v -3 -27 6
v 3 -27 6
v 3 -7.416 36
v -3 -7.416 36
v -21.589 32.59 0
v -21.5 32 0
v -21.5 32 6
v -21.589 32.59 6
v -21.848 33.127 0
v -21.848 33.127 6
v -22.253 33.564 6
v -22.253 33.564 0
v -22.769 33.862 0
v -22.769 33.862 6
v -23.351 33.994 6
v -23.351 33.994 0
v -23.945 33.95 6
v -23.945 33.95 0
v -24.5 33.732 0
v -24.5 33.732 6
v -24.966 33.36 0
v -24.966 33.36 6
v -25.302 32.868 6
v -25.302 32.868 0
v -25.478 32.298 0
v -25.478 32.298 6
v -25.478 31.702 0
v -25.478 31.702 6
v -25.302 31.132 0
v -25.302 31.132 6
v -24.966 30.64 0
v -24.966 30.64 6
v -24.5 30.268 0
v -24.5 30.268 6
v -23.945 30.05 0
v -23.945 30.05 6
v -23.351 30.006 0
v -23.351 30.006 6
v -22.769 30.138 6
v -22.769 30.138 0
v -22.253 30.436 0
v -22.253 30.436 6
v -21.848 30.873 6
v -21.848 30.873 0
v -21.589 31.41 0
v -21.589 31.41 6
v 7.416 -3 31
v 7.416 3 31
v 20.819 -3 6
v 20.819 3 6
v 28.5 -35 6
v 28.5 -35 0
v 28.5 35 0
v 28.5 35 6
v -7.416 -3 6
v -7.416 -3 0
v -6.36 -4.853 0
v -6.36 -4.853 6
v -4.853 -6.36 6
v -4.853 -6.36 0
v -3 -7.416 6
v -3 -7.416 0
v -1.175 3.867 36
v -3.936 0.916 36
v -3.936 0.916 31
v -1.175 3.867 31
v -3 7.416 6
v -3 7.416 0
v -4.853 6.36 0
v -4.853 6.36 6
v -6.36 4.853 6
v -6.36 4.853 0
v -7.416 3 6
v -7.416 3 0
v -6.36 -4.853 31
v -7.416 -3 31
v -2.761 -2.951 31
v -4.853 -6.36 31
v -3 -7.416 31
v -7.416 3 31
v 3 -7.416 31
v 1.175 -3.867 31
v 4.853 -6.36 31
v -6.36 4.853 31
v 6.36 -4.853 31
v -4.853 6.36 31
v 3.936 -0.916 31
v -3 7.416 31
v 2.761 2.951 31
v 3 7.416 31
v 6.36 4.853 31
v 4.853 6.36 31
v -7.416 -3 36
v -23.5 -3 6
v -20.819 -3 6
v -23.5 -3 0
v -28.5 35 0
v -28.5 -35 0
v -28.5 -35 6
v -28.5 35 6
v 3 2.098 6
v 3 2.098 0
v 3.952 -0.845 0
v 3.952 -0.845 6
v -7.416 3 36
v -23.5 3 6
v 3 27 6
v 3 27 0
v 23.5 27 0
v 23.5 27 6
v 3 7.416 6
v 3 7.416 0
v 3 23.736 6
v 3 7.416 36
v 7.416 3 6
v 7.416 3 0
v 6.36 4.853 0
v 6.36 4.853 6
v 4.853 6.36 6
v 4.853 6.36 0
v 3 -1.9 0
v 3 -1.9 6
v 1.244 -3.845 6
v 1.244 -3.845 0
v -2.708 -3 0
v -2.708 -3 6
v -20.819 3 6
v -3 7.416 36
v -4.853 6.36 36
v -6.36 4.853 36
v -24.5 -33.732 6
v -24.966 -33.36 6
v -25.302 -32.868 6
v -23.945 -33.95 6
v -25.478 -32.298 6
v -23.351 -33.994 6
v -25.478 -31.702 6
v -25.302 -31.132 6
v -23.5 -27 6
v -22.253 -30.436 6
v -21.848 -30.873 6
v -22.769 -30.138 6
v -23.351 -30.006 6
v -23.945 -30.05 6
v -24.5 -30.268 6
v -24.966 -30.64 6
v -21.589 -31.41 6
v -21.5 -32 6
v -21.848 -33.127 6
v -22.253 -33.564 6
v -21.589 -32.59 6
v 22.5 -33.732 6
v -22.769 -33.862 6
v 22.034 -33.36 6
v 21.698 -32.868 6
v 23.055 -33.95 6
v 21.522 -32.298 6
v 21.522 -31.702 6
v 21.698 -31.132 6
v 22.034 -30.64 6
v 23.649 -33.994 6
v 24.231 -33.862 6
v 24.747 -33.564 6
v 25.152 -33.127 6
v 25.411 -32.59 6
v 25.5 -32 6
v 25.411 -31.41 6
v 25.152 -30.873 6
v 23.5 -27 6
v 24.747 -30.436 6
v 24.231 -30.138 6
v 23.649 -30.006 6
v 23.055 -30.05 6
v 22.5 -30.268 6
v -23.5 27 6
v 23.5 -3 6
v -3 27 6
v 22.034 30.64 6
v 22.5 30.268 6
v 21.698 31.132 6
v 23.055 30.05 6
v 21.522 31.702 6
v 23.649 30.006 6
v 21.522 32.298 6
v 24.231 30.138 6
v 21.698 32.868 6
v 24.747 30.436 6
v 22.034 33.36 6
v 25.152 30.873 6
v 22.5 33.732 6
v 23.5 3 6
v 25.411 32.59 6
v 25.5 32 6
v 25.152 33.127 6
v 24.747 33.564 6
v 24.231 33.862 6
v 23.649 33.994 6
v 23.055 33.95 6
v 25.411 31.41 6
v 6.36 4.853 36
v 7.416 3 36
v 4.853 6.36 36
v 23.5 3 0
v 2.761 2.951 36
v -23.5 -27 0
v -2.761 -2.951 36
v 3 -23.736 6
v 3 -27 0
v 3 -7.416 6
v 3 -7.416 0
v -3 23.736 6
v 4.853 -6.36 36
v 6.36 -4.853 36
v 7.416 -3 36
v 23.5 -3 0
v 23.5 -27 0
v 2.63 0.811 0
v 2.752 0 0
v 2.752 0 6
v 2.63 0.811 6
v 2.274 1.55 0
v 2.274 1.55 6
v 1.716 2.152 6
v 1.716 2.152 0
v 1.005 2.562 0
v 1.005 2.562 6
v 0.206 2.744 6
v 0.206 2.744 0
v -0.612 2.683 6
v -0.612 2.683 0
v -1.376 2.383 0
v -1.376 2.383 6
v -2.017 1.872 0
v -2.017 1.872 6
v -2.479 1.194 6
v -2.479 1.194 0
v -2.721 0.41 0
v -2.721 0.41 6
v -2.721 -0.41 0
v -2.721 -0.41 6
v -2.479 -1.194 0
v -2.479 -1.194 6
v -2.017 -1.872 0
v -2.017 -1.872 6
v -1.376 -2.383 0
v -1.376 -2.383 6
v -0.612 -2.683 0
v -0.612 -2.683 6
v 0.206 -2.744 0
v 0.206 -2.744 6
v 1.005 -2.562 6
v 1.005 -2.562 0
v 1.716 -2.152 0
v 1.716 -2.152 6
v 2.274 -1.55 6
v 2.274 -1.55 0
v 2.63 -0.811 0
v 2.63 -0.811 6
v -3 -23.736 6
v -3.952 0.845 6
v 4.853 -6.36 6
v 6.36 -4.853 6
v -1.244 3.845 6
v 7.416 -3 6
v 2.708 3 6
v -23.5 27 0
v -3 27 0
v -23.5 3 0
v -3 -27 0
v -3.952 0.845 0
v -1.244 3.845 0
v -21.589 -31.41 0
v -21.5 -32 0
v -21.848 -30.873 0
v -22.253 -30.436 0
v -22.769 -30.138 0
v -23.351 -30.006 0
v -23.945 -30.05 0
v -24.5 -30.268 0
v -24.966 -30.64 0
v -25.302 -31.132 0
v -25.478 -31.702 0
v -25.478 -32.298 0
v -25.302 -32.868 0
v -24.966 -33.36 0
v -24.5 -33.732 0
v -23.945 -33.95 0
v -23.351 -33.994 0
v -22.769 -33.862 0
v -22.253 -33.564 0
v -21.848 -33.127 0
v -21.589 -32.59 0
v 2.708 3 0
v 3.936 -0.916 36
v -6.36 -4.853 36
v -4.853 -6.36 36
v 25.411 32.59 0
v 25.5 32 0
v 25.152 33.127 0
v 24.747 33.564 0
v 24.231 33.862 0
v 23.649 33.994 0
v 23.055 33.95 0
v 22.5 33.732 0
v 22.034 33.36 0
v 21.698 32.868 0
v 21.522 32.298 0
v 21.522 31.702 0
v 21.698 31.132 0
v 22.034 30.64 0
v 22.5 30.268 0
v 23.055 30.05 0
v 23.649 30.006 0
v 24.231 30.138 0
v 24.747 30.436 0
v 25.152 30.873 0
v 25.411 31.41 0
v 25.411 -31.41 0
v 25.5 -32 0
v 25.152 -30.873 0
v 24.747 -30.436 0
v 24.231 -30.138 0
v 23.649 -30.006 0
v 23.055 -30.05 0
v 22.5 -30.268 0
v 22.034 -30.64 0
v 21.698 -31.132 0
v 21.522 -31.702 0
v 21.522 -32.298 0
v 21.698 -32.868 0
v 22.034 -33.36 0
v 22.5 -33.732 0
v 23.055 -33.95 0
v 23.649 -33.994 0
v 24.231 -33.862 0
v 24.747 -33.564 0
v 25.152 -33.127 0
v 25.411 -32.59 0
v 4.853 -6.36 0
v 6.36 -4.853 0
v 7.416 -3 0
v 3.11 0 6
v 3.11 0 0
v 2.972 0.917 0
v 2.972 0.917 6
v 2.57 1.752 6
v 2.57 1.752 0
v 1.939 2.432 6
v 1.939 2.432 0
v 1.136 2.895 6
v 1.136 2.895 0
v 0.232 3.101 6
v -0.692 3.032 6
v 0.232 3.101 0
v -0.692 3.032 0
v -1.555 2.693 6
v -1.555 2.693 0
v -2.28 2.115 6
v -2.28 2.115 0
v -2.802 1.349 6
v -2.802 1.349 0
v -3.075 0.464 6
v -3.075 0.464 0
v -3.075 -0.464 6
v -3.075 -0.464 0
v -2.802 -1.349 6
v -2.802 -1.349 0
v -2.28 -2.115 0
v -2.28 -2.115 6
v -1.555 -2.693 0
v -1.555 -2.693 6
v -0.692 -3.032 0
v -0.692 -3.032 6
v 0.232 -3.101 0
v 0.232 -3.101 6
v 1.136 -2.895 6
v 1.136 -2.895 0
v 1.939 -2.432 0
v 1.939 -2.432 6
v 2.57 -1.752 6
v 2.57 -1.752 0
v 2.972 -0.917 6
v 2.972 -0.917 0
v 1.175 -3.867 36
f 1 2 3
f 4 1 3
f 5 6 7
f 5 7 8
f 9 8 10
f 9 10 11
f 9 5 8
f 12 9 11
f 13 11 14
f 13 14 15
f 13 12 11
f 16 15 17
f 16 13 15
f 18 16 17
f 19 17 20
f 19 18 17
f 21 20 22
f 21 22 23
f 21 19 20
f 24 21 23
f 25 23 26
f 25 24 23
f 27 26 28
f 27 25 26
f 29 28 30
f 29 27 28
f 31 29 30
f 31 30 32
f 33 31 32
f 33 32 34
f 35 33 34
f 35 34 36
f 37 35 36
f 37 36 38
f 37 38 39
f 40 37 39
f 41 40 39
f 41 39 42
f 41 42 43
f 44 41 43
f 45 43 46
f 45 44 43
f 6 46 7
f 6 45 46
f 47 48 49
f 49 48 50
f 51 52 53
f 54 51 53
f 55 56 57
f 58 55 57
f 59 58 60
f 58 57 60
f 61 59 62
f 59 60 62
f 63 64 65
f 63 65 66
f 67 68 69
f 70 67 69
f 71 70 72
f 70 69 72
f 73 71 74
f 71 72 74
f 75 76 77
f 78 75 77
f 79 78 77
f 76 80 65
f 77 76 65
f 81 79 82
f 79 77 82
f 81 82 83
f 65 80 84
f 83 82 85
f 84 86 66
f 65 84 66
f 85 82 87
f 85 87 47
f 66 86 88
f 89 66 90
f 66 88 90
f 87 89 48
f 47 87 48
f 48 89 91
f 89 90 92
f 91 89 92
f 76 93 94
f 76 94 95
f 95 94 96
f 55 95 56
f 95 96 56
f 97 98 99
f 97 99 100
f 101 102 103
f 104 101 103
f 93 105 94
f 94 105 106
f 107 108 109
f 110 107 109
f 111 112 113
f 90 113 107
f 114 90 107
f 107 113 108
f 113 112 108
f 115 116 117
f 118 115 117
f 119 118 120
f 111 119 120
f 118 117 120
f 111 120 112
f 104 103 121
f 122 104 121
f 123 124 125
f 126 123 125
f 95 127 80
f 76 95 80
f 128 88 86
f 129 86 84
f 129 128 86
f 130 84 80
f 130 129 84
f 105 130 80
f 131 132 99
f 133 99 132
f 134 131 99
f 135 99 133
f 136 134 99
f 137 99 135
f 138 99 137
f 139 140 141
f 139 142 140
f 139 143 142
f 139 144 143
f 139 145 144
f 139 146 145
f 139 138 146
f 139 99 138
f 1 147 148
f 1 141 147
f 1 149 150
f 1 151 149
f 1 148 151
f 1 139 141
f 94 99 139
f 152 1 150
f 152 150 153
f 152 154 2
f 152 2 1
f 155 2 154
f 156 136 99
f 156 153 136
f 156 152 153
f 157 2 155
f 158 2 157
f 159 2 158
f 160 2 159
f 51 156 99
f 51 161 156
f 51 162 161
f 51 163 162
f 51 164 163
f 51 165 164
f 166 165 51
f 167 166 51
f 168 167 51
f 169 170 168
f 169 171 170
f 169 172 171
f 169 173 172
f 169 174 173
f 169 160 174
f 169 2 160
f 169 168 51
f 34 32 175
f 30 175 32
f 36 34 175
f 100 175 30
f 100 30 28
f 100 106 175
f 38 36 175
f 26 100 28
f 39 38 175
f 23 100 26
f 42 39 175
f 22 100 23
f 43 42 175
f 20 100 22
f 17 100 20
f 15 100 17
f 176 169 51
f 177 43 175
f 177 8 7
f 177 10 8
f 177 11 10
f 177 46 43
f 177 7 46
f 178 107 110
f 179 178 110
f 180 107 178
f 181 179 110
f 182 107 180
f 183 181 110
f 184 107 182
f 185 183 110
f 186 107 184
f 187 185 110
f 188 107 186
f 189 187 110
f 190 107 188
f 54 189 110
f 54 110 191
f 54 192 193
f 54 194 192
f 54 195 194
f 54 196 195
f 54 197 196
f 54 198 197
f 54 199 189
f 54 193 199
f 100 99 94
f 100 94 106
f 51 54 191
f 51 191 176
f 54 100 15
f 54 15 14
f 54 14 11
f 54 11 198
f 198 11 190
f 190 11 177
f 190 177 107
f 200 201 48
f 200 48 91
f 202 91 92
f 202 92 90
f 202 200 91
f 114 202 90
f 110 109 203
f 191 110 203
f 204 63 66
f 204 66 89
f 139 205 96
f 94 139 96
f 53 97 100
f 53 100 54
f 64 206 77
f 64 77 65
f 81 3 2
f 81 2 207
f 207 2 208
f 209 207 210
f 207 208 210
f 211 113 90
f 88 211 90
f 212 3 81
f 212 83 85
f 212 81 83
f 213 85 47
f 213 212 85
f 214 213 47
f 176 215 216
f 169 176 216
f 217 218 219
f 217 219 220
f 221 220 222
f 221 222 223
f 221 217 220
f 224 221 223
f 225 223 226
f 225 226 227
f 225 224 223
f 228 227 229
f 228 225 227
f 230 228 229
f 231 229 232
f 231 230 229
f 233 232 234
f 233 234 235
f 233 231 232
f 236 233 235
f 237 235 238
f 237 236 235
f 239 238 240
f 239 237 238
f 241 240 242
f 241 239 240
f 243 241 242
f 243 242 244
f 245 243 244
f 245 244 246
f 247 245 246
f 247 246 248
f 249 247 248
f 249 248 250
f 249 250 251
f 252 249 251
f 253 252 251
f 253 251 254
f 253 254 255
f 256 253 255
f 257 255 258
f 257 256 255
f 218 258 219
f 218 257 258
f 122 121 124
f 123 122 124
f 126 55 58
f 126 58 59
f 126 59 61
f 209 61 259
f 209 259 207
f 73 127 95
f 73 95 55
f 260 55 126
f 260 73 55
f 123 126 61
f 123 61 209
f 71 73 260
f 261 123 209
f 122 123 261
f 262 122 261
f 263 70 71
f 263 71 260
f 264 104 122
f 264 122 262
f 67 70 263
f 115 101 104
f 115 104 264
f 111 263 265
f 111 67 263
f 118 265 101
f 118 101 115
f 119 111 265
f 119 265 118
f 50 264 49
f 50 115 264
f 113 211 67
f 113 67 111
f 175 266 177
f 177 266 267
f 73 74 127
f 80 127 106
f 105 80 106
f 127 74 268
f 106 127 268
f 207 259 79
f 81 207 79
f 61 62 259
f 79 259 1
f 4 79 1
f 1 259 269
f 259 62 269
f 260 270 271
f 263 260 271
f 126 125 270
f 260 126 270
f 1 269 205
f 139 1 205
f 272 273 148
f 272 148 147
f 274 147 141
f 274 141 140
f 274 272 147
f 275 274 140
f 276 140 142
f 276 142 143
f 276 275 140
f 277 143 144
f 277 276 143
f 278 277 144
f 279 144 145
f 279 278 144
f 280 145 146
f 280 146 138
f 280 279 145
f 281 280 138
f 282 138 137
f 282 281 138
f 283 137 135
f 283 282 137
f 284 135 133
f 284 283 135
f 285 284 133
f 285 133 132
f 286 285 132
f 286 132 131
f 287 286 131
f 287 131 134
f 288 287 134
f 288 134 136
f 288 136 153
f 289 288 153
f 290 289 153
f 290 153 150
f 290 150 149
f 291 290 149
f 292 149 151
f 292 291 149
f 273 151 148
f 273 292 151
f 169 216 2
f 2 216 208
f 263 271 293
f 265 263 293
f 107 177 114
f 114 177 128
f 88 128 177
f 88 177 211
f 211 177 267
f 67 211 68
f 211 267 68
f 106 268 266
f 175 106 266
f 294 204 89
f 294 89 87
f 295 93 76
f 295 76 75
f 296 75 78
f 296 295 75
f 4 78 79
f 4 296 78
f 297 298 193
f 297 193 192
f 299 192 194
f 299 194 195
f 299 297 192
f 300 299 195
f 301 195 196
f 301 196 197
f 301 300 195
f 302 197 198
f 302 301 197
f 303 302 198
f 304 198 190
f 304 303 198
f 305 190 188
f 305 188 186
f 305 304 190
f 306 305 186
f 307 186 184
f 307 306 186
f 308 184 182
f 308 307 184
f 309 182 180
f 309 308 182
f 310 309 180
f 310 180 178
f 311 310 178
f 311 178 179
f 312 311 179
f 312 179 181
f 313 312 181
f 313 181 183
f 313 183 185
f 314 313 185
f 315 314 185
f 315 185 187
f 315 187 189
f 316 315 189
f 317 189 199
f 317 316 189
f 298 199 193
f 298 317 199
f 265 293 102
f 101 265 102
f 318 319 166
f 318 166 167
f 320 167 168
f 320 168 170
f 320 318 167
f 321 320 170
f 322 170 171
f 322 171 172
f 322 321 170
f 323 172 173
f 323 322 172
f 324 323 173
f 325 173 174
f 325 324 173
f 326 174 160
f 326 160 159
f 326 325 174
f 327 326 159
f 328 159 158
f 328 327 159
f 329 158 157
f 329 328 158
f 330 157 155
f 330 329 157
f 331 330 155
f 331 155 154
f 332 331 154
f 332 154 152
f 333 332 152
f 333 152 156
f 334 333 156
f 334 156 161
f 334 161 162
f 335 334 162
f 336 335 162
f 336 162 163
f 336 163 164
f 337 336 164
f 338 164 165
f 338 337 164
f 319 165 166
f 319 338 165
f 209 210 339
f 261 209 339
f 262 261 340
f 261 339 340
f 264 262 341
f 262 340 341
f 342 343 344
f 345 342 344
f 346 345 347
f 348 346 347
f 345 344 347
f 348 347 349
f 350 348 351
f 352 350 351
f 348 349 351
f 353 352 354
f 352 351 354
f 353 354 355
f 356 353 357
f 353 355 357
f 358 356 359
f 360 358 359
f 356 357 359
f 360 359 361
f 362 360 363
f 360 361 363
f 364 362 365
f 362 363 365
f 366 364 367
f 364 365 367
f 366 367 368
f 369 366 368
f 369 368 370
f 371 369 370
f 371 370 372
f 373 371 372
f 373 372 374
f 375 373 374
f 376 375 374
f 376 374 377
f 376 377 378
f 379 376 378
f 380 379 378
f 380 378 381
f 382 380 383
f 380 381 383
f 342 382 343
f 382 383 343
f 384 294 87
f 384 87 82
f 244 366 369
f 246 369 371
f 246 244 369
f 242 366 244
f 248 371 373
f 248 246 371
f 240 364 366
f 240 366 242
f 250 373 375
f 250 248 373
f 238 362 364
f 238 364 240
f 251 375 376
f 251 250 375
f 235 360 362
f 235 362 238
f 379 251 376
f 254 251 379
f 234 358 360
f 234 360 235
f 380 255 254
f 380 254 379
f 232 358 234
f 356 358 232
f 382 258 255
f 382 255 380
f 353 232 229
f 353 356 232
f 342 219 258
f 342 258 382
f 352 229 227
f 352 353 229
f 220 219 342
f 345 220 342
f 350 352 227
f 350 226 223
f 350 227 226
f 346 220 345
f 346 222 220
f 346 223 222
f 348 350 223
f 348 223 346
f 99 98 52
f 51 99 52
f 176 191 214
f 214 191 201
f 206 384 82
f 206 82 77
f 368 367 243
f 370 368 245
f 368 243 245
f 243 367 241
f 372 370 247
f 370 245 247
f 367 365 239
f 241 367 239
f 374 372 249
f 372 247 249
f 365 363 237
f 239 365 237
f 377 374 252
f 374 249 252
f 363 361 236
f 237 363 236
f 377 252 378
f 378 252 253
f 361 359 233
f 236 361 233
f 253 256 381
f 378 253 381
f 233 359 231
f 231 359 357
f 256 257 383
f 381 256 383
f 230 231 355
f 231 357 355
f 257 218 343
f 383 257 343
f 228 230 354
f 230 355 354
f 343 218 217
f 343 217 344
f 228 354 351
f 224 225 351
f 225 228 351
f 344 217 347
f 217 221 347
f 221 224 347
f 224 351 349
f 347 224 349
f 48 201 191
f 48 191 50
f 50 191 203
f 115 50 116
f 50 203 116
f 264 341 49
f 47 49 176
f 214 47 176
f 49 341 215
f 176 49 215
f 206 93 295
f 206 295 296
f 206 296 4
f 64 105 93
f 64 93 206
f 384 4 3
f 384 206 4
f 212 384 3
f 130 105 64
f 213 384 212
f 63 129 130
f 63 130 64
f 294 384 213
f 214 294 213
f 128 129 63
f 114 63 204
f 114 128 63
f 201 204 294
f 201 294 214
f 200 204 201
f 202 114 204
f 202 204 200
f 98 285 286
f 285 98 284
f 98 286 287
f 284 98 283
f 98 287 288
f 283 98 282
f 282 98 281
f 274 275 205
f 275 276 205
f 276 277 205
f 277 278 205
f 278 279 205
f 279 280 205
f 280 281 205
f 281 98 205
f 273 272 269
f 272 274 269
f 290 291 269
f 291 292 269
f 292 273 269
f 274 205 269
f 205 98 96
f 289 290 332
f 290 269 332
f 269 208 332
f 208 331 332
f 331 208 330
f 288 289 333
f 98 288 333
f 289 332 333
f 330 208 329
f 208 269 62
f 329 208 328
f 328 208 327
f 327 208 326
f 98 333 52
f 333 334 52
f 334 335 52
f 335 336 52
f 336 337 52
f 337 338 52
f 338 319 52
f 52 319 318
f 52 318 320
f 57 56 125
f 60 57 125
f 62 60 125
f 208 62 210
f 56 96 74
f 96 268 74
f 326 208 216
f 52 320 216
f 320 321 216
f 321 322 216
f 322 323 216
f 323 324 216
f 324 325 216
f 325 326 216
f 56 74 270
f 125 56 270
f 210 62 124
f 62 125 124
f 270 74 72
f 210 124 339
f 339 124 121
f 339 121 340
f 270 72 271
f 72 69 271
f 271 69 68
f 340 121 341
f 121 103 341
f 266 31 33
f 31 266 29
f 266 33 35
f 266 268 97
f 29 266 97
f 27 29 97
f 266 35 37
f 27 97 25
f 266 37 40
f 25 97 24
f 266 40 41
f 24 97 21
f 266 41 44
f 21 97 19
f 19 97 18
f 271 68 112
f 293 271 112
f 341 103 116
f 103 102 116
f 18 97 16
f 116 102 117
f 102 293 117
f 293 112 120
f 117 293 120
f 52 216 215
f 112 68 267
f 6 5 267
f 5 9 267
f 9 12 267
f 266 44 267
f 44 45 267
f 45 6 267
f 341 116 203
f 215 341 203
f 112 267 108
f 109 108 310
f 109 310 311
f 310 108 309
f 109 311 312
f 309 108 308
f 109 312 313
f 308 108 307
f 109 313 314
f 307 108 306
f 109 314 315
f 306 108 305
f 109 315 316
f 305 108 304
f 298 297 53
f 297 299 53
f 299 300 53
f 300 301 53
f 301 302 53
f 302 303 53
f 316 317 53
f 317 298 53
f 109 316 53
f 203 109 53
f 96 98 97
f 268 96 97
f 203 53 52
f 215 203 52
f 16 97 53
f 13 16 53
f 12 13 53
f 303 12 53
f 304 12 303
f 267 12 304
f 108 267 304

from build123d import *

# Parameters (mm, degrees)
F0_W      = 57
F0_H      = 70
F0_R      = 2
F1_DEPTH  = 6
F0_R_2    = 3.1100578844
F0_R_3    = 2.7519114789
F3_DEPTH  = 30
F5_DEPTH  = 5
F7_DEPTH  = 25
F9_DEPTH  = 25
F11_DEPTH = 25
F13_DEPTH = 25
F15_DEPTH = 25
F17_DEPTH = 25
F19_DEPTH = 25
F21_DEPTH = 25


with BuildPart() as f1:
    # F0 (on Top) → F1 (new body)
    with BuildSketch(Plane.XY):
        Rectangle(F0_W, F0_H)
        with Locations((-23.5, -32)):
            Circle(F0_R, mode=Mode.SUBTRACT)
        with BuildLine():
            Line((-3, -27), (-23.5, -27))
            Line((-23.5, -27), (-23.5, -3))
            Line((-23.5, -3), (-7.4161984871, -3))
            ThreePointArc((-7.4161984871, -3), (-5.6568542495, -5.6568542495), (-3, -7.4161984871))
            Line((-3, -7.4161984871), (-3, -27))
        make_face(mode=Mode.SUBTRACT)
        with Locations((23.5, -32)):
            Circle(F0_R, mode=Mode.SUBTRACT)
        with BuildLine():
            Line((23.5, -3), (23.5, -27))
            Line((23.5, -27), (3, -27))
            Line((3, -27), (3, -7.4161984871))
            ThreePointArc((3, -7.4161984871), (5.6568542495, -5.6568542495), (7.4161984871, -3))
            Line((7.4161984871, -3), (23.5, -3))
        make_face(mode=Mode.SUBTRACT)
        with BuildLine():
            Line((-23.5, 3), (-23.5, 27))
            Line((-23.5, 27), (-3, 27))
            Line((-3, 27), (-3, 7.4161984871))
            ThreePointArc((-3, 7.4161984871), (-5.6568542495, 5.6568542495), (-7.4161984871, 3))
            Line((-7.4161984871, 3), (-23.5, 3))
        make_face(mode=Mode.SUBTRACT)
        with Locations((-23.5, 32)):
            Circle(F0_R, mode=Mode.SUBTRACT)
        Polygon((-2.7080128015, -3), (-3.9520826121, 0.8452078799), (-1.2440698106, 3.8452078799), (2.7080128015, 3), (3, 2.0975173043), (3.9520826121, -0.8452078799), (3, -1.8999472943), (1.2440698106, -3.8452078799), align=None, mode=Mode.SUBTRACT)
        with BuildLine():
            Line((23.5, 3), (7.4161984871, 3))
            ThreePointArc((7.4161984871, 3), (5.6568542495, 5.6568542495), (3, 7.4161984871))
            Line((3, 7.4161984871), (3, 27))
            Line((3, 27), (23.5, 27))
            Line((23.5, 27), (23.5, 3))
        make_face(mode=Mode.SUBTRACT)
        with Locations((23.5, 32)):
            Circle(F0_R, mode=Mode.SUBTRACT)
    extrude(amount=F1_DEPTH)

    # F2 (on face) → F3 (join)
    with BuildSketch(Plane.XY.offset(6)):
        with BuildLine():
            ThreePointArc((3, -4), (0, -5), (-3, -4))
            Line((-3, -4), (-3, -7.4161984871))
            Line((-3, -7.4161984871), (-3, -27))
            Line((-3, -27), (3, -27))
            Line((3, -27), (3, -7.4161984871))
            Line((3, -7.4161984871), (3, -4))
        make_face()
        with BuildLine():
            Line((23.5, 3), (7.4161984871, 3))
            Line((7.4161984871, 3), (4, 3))
            ThreePointArc((4, 3), (4.7434164903, 1.5811388301), (5, 0))
            ThreePointArc((5, 0), (4.7434164903, -1.5811388301), (4, -3))
            Line((4, -3), (7.4161984871, -3))
            Line((7.4161984871, -3), (23.5, -3))
            Line((23.5, -3), (23.5, 3))
        make_face()
        with BuildLine():
            Line((3, 27), (-3, 27))
            Line((-3, 27), (-3, 7.4161984871))
            Line((-3, 7.4161984871), (-3, 4))
            ThreePointArc((-3, 4), (0, 5), (3, 4))
            Line((3, 4), (3, 7.4161984871))
            Line((3, 7.4161984871), (3, 27))
        make_face()
        with BuildLine():
            Line((-4, 3), (-7.4161984871, 3))
            Line((-7.4161984871, 3), (-23.5, 3))
            Line((-23.5, 3), (-23.5, -3))
            Line((-23.5, -3), (-7.4161984871, -3))
            Line((-7.4161984871, -3), (-4, -3))
            ThreePointArc((-4, -3), (-5, 0), (-4, 3))
        make_face()
    extrude(amount=F3_DEPTH)

    # F4 (on face) → F5 (join)
    with BuildSketch(Plane.XY.offset(36)):
        with BuildLine():
            ThreePointArc((-7.4161984871, -3), (1.5281380997, -7.85269342), (8, 0))
            ThreePointArc((8, 0), (1.5281380997, 7.85269342), (-7.4161984871, 3))
            Line((-7.4161984871, 3), (-4, 3))
            ThreePointArc((-4, 3), (-5, 0), (-4, -3))
            Line((-4, -3), (-7.4161984871, -3))
        make_face()
        Polygon((-2.7610653181, -2.951245778), (-3.9363864757, 0.915529818), (-1.1753211575, 3.866775596), (2.7610653181, 2.951245778), (3.9363864757, -0.915529818), (1.1753211575, -3.866775596), align=None, mode=Mode.SUBTRACT)
    extrude(amount=-F5_DEPTH)

    # F6 (on face) → F7 (cut)
    with BuildSketch(Plane.YZ.offset(3)):
        Polygon((-27, 6), (-7.4161984871, 36), (-27, 36), align=None)
    extrude(amount=-F7_DEPTH, mode=Mode.SUBTRACT)

    # F8 (on face) → F9 (cut)
    with BuildSketch(Plane(origin=(0, 3, 0), x_dir=(-1, 0, 0), z_dir=(0, 1, 0))):
        Polygon((23.5, 36), (7.4161984871, 36), (23.5, 6), align=None)
    extrude(amount=-F9_DEPTH, mode=Mode.SUBTRACT)

    # F10 (on face) → F11 (cut)
    with BuildSketch(Plane(origin=(-3, 0, 0), x_dir=(0, -1, 0), z_dir=(-1, 0, 0))):
        Polygon((-27, 6), (-7.4161984871, 36), (-27, 36), align=None)
    extrude(amount=-F11_DEPTH, mode=Mode.SUBTRACT)

    # F12 (on face) → F13 (cut)
    with BuildSketch(Plane(origin=(0, 3, 0), x_dir=(-1, 0, 0), z_dir=(0, 1, 0))):
        Polygon((-23.5, 6), (-7.4161984871, 36), (-23.5, 36), align=None)
    extrude(amount=-F13_DEPTH, mode=Mode.SUBTRACT)

    # F14 (on face) → F15 (cut)
    with BuildSketch(Plane.YZ.offset(3)):
        Polygon((4, 31), (4, 6), (7.4161984871, 6), (23.7360330812, 6), (7.4161984871, 31), align=None)
    extrude(amount=-F15_DEPTH, mode=Mode.SUBTRACT)

    # F16 (on face) → F17 (cut)
    with BuildSketch(Plane(origin=(0, 3, 0), x_dir=(-1, 0, 0), z_dir=(0, 1, 0))):
        Polygon((4, 31), (4, 6), (7.4161984871, 6), (20.8193664145, 6), (7.4161984871, 31), align=None)
    extrude(amount=-F17_DEPTH, mode=Mode.SUBTRACT)

    # F18 (on face) → F19 (cut)
    with BuildSketch(Plane(origin=(-3, 0, 0), x_dir=(0, -1, 0), z_dir=(-1, 0, 0))):
        Polygon((4, 31), (4, 6), (23.7360330812, 6), (7.4161984871, 31), align=None)
    extrude(amount=-F19_DEPTH, mode=Mode.SUBTRACT)

    # F20 (on face) → F21 (cut)
    with BuildSketch(Plane(origin=(0, 3, 0), x_dir=(-1, 0, 0), z_dir=(0, 1, 0))):
        Polygon((-5.7080992435, 6), (-4, 6), (-4, 31), (-7.4161984871, 31), (-20.8193664145, 6), align=None)
    extrude(amount=-F21_DEPTH, mode=Mode.SUBTRACT)


with BuildPart() as f1b:
    # F0 (on Top) → F1, piece 2 (new body)
    with BuildSketch(Plane.XY):
        Circle(F0_R_2)
        Circle(F0_R_3, mode=Mode.SUBTRACT)
    extrude(amount=F1_DEPTH)


solid = Compound([f1.part, f1b.part])
